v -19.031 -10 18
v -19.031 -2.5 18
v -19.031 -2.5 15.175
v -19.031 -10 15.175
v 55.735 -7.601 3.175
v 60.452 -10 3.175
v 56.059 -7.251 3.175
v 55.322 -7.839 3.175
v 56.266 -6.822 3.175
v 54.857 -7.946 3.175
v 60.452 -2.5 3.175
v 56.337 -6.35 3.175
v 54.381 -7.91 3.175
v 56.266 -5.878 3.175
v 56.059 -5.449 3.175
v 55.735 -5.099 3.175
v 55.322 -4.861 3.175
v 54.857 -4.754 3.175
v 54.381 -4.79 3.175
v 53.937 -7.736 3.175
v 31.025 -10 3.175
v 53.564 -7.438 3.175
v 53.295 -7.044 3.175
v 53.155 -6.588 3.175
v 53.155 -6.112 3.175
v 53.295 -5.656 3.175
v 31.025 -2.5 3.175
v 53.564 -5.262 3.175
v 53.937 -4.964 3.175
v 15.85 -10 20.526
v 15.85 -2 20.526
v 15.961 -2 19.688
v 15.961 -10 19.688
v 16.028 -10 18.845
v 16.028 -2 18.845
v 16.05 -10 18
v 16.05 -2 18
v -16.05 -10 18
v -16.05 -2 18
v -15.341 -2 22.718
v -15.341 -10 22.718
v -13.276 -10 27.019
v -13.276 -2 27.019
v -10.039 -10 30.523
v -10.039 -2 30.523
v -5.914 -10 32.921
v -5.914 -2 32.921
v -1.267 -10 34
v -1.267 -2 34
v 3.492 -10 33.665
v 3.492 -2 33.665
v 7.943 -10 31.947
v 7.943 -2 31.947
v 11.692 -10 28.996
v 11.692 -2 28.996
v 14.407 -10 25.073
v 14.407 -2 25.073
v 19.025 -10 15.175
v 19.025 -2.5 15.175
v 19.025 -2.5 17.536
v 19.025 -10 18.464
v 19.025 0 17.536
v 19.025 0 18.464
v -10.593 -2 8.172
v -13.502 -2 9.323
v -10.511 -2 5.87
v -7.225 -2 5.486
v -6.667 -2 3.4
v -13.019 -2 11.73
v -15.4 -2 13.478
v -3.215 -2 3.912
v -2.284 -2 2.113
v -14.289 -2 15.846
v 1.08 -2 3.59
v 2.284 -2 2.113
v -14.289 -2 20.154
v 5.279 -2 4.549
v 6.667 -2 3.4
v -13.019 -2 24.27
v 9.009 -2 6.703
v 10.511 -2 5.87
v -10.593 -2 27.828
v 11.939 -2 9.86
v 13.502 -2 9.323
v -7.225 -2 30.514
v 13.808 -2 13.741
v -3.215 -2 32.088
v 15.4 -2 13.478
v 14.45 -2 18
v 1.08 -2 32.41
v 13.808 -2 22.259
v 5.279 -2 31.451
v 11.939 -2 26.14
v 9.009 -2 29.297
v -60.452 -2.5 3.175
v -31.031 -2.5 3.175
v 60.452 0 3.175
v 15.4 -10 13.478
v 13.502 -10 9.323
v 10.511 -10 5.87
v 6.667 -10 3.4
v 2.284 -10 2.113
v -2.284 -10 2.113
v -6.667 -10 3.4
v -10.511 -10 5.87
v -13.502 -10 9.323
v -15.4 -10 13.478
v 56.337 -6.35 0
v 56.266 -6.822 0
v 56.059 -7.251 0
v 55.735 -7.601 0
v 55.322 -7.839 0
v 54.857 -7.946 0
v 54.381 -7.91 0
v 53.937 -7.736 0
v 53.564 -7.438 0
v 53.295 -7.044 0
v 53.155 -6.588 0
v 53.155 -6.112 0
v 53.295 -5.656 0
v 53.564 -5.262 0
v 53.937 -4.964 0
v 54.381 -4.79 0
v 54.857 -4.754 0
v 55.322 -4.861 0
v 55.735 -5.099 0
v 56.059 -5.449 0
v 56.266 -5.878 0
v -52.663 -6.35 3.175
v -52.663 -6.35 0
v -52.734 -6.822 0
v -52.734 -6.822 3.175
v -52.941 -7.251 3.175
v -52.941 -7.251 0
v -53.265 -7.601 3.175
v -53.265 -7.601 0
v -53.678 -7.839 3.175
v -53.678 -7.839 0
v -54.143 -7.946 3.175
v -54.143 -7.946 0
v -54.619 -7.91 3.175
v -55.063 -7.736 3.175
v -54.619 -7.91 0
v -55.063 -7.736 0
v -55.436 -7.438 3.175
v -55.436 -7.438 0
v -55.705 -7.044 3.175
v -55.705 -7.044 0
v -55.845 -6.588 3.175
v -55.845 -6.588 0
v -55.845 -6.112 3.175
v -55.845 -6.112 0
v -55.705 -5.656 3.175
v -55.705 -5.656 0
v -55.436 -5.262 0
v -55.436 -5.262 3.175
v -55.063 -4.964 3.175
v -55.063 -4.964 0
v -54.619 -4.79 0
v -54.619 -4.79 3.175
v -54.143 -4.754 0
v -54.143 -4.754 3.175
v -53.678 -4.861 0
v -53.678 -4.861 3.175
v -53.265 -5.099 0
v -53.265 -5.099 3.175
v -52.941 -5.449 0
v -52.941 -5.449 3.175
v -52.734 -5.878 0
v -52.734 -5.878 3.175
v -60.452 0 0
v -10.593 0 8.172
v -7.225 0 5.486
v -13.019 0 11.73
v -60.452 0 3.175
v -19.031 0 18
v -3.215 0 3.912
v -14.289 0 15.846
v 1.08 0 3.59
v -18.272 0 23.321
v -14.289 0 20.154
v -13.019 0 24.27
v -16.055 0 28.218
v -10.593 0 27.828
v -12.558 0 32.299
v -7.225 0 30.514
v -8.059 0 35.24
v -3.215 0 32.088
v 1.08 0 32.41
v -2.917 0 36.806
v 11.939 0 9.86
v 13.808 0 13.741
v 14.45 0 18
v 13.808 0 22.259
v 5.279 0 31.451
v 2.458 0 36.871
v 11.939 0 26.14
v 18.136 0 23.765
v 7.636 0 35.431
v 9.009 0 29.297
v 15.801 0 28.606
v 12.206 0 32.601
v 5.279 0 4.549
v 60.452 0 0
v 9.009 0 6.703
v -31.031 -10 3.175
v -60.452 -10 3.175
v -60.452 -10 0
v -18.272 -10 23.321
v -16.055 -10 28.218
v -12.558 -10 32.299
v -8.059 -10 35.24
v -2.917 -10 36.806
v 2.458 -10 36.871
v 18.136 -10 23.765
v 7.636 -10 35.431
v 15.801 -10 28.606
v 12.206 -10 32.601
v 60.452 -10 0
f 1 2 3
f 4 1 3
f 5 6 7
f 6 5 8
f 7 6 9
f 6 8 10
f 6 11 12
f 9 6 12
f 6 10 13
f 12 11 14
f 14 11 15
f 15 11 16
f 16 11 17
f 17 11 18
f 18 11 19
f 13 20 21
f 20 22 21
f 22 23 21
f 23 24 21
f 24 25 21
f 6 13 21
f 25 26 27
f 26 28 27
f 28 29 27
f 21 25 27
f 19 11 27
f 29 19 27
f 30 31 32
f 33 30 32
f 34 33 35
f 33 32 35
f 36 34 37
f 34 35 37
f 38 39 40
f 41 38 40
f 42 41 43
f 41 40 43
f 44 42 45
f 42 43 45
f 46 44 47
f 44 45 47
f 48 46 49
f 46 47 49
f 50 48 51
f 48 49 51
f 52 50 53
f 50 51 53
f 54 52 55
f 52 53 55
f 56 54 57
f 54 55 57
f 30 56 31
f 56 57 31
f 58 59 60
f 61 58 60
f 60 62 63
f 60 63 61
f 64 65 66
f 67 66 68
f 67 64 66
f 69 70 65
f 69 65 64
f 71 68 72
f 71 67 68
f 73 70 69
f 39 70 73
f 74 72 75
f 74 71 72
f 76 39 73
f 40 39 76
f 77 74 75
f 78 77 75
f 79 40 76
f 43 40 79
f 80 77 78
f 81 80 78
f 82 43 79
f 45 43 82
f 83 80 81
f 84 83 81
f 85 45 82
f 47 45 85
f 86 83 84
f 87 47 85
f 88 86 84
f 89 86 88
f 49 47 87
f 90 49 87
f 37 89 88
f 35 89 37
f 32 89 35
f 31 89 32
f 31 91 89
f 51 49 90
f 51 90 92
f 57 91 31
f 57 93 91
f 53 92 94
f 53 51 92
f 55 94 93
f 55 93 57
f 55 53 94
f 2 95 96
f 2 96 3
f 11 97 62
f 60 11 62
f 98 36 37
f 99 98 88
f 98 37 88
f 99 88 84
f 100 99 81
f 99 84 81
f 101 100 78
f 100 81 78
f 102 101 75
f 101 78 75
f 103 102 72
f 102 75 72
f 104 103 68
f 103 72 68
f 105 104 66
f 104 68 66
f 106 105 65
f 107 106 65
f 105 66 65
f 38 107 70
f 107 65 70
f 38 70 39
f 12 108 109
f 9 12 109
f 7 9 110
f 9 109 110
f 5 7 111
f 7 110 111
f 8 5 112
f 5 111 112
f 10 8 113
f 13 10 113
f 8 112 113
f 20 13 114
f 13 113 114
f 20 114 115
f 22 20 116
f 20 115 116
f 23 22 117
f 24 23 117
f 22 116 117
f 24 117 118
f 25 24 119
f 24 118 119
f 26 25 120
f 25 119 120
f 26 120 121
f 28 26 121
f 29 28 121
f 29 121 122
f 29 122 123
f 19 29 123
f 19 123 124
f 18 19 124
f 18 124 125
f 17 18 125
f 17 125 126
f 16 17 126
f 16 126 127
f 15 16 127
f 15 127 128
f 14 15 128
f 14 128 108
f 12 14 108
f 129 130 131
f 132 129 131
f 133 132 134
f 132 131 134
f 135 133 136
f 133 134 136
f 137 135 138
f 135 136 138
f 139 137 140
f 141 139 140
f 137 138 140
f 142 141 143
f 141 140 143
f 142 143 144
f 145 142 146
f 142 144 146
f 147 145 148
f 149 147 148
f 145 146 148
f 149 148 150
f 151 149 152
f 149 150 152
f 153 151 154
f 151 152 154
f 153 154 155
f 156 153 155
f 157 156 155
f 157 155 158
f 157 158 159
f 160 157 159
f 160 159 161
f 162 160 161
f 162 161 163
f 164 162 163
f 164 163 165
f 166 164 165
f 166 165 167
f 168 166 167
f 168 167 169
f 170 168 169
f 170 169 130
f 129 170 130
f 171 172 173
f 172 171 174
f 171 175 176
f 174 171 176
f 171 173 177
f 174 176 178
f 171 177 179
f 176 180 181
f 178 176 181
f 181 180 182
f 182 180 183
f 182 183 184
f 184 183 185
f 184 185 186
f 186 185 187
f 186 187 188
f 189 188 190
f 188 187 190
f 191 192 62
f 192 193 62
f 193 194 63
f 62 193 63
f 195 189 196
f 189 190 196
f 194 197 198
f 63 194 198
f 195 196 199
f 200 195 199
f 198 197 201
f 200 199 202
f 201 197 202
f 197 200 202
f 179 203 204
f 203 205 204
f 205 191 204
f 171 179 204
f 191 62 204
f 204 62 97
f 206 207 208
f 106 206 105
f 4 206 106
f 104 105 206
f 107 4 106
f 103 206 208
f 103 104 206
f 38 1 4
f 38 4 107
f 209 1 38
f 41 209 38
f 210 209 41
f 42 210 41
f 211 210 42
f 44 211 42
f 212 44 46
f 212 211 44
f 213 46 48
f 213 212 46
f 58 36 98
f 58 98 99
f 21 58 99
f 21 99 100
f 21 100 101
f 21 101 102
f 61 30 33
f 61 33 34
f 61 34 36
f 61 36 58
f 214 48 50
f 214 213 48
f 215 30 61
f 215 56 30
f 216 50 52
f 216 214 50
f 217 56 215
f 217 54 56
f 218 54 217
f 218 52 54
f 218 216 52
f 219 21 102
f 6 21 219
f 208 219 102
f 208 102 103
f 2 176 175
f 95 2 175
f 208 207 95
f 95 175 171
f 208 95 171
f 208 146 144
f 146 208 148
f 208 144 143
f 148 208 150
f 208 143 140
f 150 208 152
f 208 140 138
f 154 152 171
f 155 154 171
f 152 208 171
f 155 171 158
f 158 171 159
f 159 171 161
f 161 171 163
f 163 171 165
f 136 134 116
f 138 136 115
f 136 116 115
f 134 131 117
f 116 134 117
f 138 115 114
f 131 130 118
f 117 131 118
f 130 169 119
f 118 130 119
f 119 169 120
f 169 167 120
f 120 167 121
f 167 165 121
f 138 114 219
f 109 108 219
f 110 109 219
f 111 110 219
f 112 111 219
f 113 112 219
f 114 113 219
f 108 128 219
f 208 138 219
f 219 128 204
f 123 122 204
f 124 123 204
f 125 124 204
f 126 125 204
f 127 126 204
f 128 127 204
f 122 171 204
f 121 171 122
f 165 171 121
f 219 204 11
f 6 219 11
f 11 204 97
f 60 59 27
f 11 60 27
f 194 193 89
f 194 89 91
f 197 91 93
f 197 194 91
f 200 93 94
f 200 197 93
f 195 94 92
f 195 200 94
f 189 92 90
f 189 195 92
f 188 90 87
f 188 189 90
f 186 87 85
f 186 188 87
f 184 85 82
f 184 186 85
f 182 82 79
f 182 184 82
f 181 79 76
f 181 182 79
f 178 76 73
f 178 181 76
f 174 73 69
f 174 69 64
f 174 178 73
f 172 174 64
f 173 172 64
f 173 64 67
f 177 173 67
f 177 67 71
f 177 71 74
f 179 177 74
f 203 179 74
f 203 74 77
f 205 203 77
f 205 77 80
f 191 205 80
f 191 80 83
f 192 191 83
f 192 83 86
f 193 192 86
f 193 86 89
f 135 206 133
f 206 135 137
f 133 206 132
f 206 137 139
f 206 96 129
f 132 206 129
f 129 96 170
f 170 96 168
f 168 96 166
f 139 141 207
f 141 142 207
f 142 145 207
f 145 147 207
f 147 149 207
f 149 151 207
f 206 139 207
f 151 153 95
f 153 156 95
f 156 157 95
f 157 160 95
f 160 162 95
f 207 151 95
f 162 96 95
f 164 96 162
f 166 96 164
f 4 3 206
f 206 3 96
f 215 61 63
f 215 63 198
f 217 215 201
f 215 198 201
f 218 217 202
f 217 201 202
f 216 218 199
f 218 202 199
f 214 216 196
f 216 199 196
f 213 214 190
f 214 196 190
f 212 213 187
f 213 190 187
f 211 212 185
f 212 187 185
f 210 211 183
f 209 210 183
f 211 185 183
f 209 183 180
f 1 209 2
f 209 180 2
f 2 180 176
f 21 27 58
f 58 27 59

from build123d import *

# Parameters (mm, degrees)
F1_DEPTH = 10
F0_R     = 14.45
F2_DEPTH = 1.5875
F3_R     = 1.6
F4_DEPTH = 6.35
F5_DEPTH = 2
F6_DEPTH = 2
F7_DEPTH = 10
F8_DEPTH = 2.5


with BuildPart() as f1:
    # F0 (on Front) → F1 (new body)
    with BuildSketch(Plane.XZ):
        with BuildLine():
            Line((-60.452, 3.175), (-60.452, 0))
            Line((-60.452, 0), (-15.875, 0))
            Line((-15.875, 0), (15.85, 0))
            Line((15.85, 0), (60.452, 0))
            Line((60.452, 0), (60.452, 3.175))
            Line((60.452, 3.175), (31.025, 3.175))
            Line((31.025, 3.175), (19.025, 3.175))
            Line((19.025, 3.175), (19.025, 15.175))
            Line((19.025, 15.175), (19.025, 17.53616))
            Line((19.025, 17.53616), (19.025, 18.46384))
            ThreePointArc((19.025, 18.46384), (-0.231937, 37.02924), (-19.030653, 18))
            Line((-19.030653, 18), (-19.030653, 15.175))
            Line((-19.030653, 15.175), (-19.030653, 3.175))
            Line((-19.030653, 3.175), (-31.030653, 3.175))
            Line((-31.030653, 3.175), (-60.452, 3.175))
        make_face()
        with BuildLine():
            ThreePointArc((-16.05, 18), (-1.266886, 33.999922), (15.85, 20.525866))
            ThreePointArc((15.85, 20.525866), (15.999922, 19.266886), (16.05, 18))
            ThreePointArc((16.05, 18), (0, 1.95), (-16.05, 18))
        make_face(mode=Mode.SUBTRACT)
    extrude(amount=F1_DEPTH)

    # F0 (on Front) → F2 (join)
    with BuildSketch(Plane.XZ):
        with BuildLine():
            ThreePointArc((16.05, 18), (15.999922, 19.266886), (15.85, 20.525866))
            ThreePointArc((15.85, 20.525866), (-1.266886, 33.999922), (-16.05, 18))
            ThreePointArc((-16.05, 18), (0, 1.95), (16.05, 18))
        make_face()
        with Locations((0, 18)):
            Circle(F0_R, mode=Mode.SUBTRACT)
    extrude(amount=F2_DEPTH)

    # F3 (on face) → F4 (cut)
    with BuildSketch(Plane(origin=(0, 0, 0), x_dir=(1, 0, 0), z_dir=(0, 0, -1))):
        with Locations((-54.263, 6.35)):
            Circle(F3_R)
        with Locations((54.737, 6.35)):
            Circle(F3_R)
    extrude(amount=-F4_DEPTH, mode=Mode.SUBTRACT)

    # F0 (on Front) → F5 (join)
    with BuildSketch(Plane.XZ):
        with BuildLine():
            ThreePointArc((16.05, 18), (15.999922, 19.266886), (15.85, 20.525866))
            ThreePointArc((15.85, 20.525866), (-1.266886, 33.999922), (-16.05, 18))
            ThreePointArc((-16.05, 18), (0, 1.95), (16.05, 18))
        make_face()
        with Locations((0, 18)):
            Circle(F0_R, mode=Mode.SUBTRACT)
    extrude(amount=F5_DEPTH)

    # F0 (on Front) → F6 (join)
    with BuildSketch(Plane.XZ):
        Polygon((31.025, 3.175), (60.452, 3.175), (19.025, 17.53616), (19.025, 15.175), align=None)
        Polygon((-19.030653, 18), (-60.452, 3.175), (-31.030653, 3.175), (-19.030653, 15.175), align=None)
    extrude(amount=F6_DEPTH)

    # F0 (on Front) → F7 (join)
    with BuildSketch(Plane.XZ):
        Polygon((19.025, 3.175), (31.025, 3.175), (19.025, 15.175), align=None)
        Polygon((-19.030653, 15.175), (-31.030653, 3.175), (-19.030653, 3.175), align=None)
    extrude(amount=F7_DEPTH)

    # F0 (on Front) → F8 (join)
    with BuildSketch(Plane.XZ):
        Polygon((31.025, 3.175), (60.452, 3.175), (19.025, 17.53616), (19.025, 15.175), align=None)
        Polygon((-19.030653, 18), (-60.452, 3.175), (-31.030653, 3.175), (-19.030653, 15.175), align=None)
    extrude(amount=F8_DEPTH)


solid = f1.part
